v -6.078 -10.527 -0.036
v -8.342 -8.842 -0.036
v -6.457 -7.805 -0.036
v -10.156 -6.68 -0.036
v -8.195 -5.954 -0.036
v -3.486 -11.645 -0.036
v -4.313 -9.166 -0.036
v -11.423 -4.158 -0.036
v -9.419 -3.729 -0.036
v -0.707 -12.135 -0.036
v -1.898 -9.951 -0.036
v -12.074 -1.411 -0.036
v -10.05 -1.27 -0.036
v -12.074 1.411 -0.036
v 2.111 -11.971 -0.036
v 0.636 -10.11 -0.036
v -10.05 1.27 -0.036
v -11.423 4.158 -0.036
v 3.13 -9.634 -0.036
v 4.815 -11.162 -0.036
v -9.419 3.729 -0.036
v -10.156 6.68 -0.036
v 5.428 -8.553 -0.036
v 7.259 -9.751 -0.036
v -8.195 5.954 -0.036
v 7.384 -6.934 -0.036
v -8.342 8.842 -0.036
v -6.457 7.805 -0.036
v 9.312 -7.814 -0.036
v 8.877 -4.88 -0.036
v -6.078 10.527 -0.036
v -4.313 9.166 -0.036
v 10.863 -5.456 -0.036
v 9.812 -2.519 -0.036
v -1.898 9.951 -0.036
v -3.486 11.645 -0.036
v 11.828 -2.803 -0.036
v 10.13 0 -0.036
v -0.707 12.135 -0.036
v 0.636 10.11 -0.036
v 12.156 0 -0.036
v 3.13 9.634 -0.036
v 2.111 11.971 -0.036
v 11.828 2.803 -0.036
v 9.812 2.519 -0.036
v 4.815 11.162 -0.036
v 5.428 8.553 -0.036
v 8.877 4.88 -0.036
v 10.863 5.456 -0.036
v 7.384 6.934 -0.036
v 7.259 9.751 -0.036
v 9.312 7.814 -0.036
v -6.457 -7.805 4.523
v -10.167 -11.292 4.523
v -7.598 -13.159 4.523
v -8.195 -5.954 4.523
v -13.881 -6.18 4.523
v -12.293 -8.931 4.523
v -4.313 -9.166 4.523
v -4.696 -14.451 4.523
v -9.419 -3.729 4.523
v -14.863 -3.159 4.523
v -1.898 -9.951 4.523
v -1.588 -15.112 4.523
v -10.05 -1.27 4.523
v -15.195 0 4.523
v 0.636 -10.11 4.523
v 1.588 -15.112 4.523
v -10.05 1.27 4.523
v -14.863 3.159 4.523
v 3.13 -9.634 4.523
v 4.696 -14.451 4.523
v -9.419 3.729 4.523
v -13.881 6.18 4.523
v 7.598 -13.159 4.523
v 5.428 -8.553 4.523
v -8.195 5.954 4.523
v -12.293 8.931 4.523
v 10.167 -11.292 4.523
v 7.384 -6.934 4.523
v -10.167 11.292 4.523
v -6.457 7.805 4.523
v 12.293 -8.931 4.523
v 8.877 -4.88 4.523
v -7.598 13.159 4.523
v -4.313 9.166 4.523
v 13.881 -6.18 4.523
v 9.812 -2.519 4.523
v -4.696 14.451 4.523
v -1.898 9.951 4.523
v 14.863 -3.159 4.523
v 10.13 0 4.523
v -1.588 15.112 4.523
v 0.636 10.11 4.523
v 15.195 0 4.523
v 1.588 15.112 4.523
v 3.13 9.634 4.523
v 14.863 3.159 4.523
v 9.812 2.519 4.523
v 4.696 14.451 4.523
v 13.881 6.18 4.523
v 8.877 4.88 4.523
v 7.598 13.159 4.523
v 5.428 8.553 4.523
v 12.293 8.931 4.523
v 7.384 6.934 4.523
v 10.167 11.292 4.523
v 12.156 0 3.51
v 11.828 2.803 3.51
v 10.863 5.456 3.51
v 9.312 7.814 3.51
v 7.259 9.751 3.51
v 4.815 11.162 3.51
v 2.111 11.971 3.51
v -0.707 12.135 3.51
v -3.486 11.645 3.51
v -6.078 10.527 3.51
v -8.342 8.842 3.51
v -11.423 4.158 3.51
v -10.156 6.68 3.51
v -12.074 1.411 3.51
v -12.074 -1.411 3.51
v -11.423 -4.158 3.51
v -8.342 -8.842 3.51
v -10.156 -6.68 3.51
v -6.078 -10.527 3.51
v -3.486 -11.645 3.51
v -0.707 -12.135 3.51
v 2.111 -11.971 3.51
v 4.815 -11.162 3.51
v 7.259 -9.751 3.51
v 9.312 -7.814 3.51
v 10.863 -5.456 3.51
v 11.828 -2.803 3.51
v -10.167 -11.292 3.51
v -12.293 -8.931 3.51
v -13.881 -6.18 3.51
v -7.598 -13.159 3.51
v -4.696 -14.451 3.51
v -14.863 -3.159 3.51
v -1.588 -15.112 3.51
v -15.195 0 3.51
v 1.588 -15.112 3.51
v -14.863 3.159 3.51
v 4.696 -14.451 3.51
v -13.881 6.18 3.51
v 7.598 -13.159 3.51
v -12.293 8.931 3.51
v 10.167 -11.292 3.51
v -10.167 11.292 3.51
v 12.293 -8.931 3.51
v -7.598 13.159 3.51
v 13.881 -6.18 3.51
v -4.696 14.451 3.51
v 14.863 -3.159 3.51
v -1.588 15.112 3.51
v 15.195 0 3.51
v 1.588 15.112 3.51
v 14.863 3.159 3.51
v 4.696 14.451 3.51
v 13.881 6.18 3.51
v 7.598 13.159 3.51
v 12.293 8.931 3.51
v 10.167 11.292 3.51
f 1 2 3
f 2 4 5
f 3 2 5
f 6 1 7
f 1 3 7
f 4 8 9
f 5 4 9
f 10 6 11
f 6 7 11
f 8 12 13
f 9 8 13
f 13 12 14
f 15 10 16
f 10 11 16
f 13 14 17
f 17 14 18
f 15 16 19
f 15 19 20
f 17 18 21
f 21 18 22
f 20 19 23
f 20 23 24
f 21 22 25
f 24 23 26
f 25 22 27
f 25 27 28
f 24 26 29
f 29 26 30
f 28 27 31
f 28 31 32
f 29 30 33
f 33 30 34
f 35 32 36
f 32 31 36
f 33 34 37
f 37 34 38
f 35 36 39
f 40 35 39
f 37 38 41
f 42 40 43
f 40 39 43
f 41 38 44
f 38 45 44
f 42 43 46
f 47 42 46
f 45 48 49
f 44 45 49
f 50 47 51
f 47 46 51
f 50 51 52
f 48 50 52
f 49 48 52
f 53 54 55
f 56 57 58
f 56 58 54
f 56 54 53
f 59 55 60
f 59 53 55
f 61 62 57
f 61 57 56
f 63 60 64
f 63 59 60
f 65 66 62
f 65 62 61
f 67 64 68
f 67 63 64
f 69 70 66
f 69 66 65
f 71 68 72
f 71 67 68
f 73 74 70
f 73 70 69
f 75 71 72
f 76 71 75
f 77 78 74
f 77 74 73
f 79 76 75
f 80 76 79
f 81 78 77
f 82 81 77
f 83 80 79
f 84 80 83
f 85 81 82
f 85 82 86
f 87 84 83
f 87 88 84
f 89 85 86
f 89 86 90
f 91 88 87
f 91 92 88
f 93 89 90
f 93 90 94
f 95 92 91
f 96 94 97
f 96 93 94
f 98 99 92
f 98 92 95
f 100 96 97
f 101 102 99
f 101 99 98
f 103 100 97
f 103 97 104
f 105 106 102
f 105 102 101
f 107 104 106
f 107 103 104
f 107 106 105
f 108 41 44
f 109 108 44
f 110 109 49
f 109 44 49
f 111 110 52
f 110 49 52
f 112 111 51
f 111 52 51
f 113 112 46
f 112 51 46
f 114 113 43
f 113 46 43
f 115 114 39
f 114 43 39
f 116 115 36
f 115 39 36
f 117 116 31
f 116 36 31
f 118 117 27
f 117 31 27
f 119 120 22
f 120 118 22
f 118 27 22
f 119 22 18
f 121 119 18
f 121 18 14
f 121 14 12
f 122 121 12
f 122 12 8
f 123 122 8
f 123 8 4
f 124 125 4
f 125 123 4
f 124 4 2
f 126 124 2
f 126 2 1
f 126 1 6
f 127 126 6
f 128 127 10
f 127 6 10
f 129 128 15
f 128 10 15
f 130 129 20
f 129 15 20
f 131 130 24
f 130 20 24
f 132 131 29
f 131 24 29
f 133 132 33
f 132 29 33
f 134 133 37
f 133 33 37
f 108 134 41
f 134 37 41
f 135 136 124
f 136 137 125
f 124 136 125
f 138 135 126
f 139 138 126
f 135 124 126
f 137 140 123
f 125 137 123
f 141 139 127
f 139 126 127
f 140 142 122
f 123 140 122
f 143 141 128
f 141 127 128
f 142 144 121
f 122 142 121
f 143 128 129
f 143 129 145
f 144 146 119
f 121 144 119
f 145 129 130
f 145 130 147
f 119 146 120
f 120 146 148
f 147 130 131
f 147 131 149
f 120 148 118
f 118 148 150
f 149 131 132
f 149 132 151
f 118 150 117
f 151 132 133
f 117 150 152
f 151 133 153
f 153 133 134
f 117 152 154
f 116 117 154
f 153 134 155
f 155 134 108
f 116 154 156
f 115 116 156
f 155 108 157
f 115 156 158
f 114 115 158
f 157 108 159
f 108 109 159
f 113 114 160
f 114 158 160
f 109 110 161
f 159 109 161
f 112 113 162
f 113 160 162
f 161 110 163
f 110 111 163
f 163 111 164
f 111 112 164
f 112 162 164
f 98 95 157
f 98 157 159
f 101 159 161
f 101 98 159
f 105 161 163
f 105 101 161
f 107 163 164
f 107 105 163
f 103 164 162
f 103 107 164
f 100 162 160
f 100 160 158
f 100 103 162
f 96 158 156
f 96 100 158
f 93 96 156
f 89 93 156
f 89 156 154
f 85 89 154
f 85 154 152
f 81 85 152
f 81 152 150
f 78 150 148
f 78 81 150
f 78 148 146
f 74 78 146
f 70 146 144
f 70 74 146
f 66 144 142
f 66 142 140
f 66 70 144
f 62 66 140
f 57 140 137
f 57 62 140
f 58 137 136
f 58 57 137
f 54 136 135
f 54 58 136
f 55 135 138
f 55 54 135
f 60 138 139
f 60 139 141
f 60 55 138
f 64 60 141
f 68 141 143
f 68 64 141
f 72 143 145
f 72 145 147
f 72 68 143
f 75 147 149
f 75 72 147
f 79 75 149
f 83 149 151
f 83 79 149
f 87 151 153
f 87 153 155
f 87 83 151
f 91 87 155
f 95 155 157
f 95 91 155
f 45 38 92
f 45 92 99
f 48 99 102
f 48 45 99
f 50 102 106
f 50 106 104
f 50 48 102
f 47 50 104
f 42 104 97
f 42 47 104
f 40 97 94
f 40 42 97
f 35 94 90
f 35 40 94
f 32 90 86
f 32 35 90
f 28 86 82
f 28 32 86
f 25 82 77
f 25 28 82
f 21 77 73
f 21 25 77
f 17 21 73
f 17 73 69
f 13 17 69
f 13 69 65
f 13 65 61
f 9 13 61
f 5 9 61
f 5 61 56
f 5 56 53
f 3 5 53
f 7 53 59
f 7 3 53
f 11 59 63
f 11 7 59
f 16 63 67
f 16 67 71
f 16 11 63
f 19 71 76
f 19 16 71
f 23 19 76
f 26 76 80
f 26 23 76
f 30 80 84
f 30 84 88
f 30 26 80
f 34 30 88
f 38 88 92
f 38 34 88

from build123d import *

# Parameters (mm, degrees)
SKETCH1_R           = 12
SKETCH1_R_2         = 10
BOSS_EXTRUDE1_DEPTH = 4.5
SKETCH2_R           = 15
SKETCH2_R_2         = 11
BOSS_EXTRUDE2_DEPTH = 1
SCALE1_SCALE        = 1.013


with BuildPart() as part:
    # Sketch1 → Boss-Extrude1 (new body)
    with BuildSketch(Plane.XY):
        Circle(SKETCH1_R)
        Circle(SKETCH1_R_2, mode=Mode.SUBTRACT)
    extrude(amount=BOSS_EXTRUDE1_DEPTH)

    # Sketch2 → Boss-Extrude2 (add)
    with BuildSketch(Plane.XY.offset(4.5)):
        Circle(SKETCH2_R)
        Circle(SKETCH2_R_2, mode=Mode.SUBTRACT)
    extrude(amount=-BOSS_EXTRUDE2_DEPTH)


with BuildPart() as part_1:
    # Scale1: scaled about (0, 0, 2.758064516)
    add(part.part.scale(SCALE1_SCALE).moved(Location((0, 0, -0.035854839))))


solid = part_1.part
